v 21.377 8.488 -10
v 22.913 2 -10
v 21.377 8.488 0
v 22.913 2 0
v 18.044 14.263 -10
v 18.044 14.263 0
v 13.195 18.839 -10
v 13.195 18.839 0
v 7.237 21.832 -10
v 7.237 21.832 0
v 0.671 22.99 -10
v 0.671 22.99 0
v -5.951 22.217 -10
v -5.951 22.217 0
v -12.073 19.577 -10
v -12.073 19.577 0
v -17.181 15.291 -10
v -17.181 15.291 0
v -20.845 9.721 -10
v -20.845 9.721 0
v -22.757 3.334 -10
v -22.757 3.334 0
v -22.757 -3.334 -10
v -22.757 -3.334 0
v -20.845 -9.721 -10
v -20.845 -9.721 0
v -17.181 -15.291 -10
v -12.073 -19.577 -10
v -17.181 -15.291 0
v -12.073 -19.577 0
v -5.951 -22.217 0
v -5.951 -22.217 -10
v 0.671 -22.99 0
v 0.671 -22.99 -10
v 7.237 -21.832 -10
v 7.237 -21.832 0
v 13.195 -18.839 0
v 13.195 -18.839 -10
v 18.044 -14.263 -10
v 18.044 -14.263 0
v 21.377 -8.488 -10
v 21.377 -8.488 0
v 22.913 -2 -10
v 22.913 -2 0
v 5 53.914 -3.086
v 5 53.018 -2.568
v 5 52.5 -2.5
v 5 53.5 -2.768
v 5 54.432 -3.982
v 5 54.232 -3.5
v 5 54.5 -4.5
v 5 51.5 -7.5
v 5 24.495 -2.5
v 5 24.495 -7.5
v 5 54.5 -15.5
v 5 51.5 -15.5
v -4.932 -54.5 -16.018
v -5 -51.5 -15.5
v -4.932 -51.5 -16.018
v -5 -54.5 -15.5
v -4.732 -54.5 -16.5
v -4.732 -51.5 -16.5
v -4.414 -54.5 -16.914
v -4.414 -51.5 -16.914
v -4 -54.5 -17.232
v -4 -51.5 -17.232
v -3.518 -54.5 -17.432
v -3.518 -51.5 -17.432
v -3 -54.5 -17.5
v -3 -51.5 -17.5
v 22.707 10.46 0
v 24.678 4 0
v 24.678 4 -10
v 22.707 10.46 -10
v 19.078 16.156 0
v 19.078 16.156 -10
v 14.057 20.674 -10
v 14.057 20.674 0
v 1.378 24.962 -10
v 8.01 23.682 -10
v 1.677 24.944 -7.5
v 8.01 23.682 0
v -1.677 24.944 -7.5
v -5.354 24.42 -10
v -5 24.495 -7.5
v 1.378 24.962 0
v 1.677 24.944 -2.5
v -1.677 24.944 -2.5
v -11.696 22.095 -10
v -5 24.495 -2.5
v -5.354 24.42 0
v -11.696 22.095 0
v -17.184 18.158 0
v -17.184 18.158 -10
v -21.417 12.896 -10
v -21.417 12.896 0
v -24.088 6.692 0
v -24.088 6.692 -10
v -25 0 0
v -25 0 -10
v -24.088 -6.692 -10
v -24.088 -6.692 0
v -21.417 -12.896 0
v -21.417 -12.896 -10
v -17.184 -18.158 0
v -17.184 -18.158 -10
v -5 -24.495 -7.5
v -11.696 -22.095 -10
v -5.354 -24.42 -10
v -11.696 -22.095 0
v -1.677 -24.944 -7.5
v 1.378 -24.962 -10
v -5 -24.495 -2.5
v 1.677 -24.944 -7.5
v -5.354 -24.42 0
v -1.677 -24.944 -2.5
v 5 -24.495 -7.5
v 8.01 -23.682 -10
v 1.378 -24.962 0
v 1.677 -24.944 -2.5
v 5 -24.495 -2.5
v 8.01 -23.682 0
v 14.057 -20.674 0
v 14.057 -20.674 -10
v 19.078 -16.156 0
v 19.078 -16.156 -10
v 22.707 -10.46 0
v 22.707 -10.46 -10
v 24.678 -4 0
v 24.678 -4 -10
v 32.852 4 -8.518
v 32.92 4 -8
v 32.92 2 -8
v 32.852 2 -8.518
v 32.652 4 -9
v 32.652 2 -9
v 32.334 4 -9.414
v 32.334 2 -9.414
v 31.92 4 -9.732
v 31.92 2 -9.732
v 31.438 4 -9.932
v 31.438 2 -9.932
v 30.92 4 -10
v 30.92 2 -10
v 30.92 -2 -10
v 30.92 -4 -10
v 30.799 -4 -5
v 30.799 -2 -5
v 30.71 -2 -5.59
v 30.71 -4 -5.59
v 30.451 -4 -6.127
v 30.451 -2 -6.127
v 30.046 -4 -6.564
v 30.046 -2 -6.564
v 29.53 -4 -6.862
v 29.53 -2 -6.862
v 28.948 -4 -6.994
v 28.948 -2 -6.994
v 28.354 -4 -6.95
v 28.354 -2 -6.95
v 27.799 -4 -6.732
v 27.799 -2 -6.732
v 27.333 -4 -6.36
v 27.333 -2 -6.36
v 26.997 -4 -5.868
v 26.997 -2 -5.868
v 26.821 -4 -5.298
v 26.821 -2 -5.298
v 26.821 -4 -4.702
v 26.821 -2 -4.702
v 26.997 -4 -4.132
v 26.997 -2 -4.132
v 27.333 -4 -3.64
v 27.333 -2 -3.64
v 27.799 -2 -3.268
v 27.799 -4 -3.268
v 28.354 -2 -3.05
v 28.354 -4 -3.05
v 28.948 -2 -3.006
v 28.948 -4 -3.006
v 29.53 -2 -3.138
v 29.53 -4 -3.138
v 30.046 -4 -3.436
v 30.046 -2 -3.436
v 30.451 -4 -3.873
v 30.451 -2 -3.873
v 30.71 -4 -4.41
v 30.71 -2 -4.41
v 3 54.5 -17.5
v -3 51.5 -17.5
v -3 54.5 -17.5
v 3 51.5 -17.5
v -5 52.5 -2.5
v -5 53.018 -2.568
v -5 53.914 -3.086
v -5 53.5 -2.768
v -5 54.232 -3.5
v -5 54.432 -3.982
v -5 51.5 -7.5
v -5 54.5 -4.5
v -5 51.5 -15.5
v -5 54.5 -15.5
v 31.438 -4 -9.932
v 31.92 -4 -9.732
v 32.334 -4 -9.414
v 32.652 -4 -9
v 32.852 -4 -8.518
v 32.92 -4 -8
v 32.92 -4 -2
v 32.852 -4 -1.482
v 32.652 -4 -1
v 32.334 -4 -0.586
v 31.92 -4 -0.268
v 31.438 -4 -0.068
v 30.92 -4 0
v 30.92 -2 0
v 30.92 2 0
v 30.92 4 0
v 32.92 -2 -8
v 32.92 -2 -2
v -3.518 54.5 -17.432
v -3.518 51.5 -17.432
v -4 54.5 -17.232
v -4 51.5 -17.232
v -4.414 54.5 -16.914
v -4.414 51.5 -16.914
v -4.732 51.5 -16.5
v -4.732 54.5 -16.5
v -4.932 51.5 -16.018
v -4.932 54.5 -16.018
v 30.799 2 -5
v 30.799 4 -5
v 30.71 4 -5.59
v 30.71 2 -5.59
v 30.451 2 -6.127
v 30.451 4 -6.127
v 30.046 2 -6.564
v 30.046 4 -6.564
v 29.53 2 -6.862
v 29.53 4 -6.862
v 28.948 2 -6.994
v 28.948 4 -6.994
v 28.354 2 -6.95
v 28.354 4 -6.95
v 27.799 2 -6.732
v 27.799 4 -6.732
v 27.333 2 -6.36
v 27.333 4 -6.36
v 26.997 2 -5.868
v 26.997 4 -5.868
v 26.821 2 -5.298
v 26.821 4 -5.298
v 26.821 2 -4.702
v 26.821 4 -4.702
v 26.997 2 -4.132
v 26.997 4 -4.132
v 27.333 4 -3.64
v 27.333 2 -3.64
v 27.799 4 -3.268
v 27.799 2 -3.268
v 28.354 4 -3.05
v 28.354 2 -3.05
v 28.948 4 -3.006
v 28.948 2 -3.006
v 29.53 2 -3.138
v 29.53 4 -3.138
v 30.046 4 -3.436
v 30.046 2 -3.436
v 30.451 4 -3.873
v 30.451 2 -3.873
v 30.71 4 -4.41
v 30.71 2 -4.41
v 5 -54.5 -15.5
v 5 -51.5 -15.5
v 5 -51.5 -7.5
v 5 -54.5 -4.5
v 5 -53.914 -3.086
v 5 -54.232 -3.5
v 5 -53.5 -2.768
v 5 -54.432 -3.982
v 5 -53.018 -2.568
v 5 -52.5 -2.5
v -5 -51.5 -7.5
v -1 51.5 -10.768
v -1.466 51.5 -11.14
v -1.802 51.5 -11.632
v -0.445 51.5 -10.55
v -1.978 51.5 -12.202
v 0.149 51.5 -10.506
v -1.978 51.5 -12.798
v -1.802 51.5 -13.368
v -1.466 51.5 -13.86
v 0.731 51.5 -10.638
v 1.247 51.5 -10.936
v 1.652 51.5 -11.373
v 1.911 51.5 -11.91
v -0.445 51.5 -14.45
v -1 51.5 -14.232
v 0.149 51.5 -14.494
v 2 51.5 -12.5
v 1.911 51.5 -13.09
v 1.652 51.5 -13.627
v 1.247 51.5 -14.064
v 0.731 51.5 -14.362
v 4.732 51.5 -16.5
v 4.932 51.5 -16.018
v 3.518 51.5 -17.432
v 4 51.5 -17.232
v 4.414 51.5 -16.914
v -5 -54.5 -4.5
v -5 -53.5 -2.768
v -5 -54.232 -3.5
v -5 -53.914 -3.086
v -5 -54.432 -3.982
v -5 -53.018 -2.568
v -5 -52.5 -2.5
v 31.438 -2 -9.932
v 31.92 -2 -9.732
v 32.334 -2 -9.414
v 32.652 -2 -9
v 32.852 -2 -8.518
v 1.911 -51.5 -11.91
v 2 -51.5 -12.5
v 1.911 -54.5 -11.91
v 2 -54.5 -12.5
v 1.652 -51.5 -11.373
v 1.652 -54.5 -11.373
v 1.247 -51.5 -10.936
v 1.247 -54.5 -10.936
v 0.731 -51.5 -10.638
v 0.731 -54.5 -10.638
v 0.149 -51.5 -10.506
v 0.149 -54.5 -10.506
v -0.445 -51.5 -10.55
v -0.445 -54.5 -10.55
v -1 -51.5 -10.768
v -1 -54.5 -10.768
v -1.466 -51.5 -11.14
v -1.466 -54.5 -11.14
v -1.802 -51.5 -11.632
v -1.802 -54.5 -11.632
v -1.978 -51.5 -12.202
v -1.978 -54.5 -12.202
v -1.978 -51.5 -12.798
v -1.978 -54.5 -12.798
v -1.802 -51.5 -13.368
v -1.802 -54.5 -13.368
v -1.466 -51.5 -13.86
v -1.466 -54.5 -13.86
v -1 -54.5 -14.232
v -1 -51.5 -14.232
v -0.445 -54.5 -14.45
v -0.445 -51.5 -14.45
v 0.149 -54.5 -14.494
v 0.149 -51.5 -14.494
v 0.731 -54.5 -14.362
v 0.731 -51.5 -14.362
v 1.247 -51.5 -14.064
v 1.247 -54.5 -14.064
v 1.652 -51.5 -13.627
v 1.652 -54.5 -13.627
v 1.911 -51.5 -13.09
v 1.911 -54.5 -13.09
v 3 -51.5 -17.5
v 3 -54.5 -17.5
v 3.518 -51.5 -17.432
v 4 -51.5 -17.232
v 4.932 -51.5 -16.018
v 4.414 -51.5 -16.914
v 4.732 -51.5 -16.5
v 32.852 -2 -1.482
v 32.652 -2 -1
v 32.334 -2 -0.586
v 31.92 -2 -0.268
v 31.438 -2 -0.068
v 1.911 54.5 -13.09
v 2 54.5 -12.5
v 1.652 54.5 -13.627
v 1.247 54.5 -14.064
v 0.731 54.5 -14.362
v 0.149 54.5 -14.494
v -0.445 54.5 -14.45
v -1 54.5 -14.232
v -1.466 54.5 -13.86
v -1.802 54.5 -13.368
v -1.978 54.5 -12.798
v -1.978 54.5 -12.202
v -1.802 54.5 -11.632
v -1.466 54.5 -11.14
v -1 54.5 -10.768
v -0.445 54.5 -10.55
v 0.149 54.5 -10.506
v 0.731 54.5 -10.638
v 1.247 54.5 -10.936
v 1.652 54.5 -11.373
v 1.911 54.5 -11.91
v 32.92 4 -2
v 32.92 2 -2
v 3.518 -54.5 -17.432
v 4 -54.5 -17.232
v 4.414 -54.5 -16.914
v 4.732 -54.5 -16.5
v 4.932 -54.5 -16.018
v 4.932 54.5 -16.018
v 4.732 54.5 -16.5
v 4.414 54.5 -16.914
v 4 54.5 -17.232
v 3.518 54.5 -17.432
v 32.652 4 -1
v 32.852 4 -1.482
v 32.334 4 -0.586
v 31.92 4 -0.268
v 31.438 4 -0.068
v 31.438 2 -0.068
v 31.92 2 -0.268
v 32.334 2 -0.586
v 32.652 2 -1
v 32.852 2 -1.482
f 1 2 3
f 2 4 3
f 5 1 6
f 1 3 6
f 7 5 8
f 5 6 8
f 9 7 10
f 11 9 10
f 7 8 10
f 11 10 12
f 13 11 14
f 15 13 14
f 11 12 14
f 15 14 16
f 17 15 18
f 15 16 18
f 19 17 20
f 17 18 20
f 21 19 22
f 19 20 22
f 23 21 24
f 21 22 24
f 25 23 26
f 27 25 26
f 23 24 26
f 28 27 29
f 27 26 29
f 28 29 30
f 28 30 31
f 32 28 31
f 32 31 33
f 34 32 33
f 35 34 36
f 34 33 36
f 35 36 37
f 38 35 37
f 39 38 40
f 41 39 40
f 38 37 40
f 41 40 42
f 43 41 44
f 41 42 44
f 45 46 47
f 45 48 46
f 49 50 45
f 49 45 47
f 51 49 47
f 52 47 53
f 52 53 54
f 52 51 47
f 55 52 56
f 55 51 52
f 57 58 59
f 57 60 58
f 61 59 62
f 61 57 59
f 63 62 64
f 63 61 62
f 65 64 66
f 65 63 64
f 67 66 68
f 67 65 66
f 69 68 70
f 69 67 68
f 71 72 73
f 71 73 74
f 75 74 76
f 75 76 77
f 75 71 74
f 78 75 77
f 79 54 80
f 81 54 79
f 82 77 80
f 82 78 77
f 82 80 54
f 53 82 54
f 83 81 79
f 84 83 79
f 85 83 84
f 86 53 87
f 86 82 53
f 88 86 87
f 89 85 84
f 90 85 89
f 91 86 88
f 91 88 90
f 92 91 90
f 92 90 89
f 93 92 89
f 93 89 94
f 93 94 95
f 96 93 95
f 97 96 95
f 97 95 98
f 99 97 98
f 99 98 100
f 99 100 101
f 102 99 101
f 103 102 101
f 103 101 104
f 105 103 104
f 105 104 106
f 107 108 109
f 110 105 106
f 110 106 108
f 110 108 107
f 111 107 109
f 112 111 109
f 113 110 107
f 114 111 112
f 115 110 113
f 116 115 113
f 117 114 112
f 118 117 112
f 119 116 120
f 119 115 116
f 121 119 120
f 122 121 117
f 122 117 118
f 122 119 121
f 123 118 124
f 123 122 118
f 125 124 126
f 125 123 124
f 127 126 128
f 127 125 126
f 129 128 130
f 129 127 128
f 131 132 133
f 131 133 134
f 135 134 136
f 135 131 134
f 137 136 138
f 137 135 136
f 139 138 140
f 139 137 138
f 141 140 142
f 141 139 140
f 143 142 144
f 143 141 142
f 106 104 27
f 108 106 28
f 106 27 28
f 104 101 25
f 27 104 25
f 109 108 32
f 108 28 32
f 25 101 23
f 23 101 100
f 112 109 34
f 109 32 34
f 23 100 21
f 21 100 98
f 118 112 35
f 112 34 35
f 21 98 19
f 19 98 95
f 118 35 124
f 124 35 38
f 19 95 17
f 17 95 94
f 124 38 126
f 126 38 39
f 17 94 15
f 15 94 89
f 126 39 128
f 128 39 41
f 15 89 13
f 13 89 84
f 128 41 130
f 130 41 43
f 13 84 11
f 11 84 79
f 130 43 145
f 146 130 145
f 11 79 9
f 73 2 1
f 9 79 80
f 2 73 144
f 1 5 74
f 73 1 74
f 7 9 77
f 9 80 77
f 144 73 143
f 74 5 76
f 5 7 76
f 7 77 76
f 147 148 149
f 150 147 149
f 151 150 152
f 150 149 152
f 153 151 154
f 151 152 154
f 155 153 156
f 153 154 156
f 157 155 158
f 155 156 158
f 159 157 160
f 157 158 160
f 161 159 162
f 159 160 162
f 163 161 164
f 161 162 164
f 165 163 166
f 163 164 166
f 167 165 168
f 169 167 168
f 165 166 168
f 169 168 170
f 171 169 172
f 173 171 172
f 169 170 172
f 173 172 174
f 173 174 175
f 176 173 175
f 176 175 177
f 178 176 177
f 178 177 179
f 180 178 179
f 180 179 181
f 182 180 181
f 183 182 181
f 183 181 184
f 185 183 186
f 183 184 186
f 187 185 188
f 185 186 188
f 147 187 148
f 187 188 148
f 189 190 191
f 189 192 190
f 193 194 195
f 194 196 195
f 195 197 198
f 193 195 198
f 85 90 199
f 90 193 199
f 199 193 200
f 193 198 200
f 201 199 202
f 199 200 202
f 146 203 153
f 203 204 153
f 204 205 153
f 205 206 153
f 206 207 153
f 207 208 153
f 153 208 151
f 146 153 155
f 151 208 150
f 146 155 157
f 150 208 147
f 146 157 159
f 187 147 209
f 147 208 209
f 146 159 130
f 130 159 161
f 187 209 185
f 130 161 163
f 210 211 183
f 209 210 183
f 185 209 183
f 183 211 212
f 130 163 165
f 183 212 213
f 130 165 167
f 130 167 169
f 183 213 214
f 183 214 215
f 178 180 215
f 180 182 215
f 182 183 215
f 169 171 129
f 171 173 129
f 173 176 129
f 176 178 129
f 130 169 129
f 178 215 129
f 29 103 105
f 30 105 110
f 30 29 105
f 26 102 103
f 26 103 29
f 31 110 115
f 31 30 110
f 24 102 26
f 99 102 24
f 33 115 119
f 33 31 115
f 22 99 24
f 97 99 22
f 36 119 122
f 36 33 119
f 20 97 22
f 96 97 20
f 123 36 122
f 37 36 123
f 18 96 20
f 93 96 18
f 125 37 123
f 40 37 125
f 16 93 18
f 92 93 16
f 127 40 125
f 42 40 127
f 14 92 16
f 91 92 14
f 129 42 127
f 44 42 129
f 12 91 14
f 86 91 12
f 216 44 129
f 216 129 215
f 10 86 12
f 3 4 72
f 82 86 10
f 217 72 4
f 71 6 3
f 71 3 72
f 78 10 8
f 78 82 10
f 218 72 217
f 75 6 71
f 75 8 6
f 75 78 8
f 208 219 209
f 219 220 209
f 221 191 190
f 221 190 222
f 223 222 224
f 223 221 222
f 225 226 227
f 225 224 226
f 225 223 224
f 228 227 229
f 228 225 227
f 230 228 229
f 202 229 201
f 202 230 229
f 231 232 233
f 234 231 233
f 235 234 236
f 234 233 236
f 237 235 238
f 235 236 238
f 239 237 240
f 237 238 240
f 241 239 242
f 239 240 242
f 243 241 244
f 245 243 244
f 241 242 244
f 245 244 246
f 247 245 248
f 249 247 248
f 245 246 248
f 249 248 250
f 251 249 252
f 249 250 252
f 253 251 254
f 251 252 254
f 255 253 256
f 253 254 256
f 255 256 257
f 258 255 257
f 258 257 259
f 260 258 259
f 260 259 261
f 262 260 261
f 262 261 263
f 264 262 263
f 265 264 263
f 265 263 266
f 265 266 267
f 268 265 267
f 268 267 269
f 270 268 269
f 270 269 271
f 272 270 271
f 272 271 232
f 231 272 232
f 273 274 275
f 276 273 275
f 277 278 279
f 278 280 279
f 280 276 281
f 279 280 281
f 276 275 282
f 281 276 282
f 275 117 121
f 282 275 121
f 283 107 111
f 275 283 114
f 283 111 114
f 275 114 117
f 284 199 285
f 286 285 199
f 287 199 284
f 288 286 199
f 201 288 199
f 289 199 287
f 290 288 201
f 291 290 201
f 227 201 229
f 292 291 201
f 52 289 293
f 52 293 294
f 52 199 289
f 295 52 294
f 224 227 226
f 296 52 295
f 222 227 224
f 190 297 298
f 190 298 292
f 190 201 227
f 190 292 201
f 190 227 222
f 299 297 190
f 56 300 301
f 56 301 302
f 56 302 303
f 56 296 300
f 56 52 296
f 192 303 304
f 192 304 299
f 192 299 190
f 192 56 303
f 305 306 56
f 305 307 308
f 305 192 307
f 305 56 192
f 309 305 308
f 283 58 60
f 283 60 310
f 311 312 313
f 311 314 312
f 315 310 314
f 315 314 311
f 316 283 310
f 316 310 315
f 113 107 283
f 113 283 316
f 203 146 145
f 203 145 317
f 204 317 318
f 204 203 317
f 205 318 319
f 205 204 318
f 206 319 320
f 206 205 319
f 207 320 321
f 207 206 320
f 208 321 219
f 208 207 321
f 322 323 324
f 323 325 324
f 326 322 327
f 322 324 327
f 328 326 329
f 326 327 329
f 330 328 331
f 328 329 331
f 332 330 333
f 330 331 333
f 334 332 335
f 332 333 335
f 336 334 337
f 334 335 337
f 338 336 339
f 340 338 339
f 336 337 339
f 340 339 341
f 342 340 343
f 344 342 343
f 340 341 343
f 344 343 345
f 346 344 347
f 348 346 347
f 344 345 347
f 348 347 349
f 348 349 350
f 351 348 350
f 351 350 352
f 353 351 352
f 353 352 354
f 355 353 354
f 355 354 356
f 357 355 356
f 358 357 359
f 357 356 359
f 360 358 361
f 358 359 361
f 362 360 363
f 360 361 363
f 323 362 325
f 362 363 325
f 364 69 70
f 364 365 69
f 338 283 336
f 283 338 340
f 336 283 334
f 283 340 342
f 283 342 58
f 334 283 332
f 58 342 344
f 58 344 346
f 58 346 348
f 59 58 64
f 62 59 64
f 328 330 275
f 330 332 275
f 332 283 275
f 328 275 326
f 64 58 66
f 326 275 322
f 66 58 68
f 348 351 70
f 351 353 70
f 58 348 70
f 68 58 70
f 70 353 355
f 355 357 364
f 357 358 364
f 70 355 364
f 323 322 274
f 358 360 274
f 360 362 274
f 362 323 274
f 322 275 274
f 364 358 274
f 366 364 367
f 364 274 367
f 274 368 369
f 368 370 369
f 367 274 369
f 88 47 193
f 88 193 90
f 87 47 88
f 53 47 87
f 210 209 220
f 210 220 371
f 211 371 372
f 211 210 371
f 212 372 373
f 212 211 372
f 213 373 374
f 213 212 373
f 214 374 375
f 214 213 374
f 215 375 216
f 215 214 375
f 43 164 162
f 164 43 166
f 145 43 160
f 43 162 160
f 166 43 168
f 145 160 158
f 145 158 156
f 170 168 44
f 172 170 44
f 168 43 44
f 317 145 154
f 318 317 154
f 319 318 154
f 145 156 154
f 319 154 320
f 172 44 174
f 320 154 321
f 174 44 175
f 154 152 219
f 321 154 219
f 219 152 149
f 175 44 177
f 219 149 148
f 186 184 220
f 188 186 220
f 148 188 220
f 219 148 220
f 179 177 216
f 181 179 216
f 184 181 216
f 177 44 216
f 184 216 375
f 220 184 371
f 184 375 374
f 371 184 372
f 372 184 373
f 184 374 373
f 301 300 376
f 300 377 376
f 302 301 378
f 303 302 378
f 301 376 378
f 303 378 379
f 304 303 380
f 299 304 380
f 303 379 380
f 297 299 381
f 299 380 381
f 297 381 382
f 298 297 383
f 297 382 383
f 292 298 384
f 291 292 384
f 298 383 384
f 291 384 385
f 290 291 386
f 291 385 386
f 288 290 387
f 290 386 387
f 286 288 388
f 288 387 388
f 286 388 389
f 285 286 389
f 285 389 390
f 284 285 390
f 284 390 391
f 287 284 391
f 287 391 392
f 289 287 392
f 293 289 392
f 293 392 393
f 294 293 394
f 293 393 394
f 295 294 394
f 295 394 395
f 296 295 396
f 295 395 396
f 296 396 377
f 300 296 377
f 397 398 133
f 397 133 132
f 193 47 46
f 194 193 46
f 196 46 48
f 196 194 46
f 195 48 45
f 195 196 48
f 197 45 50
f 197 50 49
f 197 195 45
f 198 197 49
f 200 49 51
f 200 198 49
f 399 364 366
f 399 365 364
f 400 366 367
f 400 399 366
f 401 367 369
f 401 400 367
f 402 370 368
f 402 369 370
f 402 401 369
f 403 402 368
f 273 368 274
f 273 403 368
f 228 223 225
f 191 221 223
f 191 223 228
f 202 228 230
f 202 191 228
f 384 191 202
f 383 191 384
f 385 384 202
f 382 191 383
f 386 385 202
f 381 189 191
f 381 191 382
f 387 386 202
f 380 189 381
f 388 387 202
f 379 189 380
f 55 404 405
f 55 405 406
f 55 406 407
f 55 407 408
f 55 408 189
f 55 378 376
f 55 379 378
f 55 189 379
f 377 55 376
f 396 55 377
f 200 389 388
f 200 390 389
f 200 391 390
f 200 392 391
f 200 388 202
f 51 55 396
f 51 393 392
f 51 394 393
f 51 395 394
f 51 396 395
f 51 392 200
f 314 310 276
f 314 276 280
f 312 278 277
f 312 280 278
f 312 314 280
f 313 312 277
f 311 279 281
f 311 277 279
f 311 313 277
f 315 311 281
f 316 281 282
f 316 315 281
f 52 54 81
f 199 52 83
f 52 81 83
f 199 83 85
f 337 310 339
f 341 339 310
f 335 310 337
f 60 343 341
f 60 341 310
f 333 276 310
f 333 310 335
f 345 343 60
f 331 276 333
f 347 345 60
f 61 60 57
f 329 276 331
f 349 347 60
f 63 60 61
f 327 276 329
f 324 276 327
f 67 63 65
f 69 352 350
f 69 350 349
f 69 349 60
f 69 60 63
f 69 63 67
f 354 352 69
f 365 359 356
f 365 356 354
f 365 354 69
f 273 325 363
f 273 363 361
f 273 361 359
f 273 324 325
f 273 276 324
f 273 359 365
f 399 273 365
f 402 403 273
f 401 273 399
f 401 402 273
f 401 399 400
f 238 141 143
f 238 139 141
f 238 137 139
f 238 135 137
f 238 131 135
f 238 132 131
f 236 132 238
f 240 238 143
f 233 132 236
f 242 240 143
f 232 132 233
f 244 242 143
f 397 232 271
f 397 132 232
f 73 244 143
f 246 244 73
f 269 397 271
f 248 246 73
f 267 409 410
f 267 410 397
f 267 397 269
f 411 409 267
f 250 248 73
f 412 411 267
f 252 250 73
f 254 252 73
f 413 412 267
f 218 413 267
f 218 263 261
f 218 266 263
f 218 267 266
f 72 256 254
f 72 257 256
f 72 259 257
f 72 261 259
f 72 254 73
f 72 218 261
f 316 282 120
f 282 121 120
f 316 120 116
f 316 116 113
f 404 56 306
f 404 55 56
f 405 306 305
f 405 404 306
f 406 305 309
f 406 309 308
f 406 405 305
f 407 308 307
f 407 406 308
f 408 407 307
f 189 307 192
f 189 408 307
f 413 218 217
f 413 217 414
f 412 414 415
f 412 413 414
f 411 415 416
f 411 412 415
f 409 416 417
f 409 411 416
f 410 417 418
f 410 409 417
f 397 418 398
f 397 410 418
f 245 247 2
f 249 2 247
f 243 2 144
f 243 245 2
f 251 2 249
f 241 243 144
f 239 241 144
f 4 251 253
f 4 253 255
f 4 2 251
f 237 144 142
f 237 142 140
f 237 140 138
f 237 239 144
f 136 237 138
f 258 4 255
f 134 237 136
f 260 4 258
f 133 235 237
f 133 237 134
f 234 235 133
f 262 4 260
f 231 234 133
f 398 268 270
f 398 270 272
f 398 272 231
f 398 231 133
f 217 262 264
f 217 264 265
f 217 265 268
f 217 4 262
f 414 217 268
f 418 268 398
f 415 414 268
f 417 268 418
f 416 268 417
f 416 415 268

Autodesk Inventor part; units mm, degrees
ref_plane "XY Plane" through (0, 0, 0) normal (0, 0, 1) x (1, 0, 0)
sketch "Sketch1" plane through (0, 0, 0) normal (0, 0, 1) x (1, 0, 0)
  arc A0 (22.9129, 2) -> (22.9129, -2) centre (0, 0) ccw
  arc A1 (24.6779, 4) -> (24.6779, -4) centre (0, 0) ccw
  line L0 (22.9129, 2) -> (24.9199, 2)
  line L1 (22.9129, -2) -> (24.9199, -2)
  line L2 (24.9199, 2) -> (32.9199, 2)
  line L3 (32.9199, 2) -> (32.9199, 4)
  line L4 (32.9199, 4) -> (24.6779, 4)
  line L5 (24.9199, -2) -> (32.9199, -2)
  line L6 (32.9199, -2) -> (32.9199, -4)
  line L7 (32.9199, -4) -> (24.6779, -4)
  dimension "d0" = 46
  dimension "d1" = 50
  dimension "d7" = 2
  dimension "d9" = 2
extrude "Extrusion1" add sketch "Sketch1" against normal blind 10
sketch "Sketch2" plane through (24.6779, 4, 0) normal (0, 1, 0) x (1, 0, 0)
  line L0 (8.2419, 0) -> (0, 0) projected
  line L1 (8.2419, 0) -> (8.2419, 10) projected
  line L2 (0, 10) -> (8.2419, 10) projected
  line L3 (0, 0) -> (0, 10) projected
  circle A0 centre (4.121, 5) radius 2
  point P0 (-24.6779, 0)
  dimension "d12" = 4
extrude "Extrusion2" cut sketch "Sketch2" against normal blind 8.5 contours A0
ref_plane "Work Plane1" through (24.6779, 24, 0) normal (0, 1, 0) x (1, 0, 0)
sketch "Sketch3" plane through (24.6779, 24, 0) normal (0, 1, 0) x (1, 0, 0)
  line L0 (-24.6779, 0) -> (-24.6779, 10)
  line L1 (-19.6779, 7.5) -> (-29.6779, 7.5)
  line L2 (-29.6779, 2.5) -> (-19.6779, 2.5)
  line L3 (-19.6779, 2.5) -> (-19.6779, 7.5)
  line L4 (-29.6779, 2.5) -> (-29.6779, 7.5)
  point P0 (-24.6779, 5)
extrude "Extrusion3" add sketch "Sketch3" along normal blind 27.5
sketch "Sketch4" plane through (5, 24.4949, -6) normal (1, 0, 0) x (0, 0, -1)
  line L0 (1.5, 27.0051) -> (-3.5, 27.0051) projected
  line L1 (-3.5, 27.0051) -> (11.5, 27.0051)
  line L2 (11.5, 27.0051) -> (11.5, 30.0051)
  line L3 (11.5, 30.0051) -> (-3.5, 30.0051)
  line L4 (-3.5, 30.0051) -> (-3.5, 27.0051)
  point P0 (-6, -24.4949)
  dimension "d27" = 15
  dimension "d28" = 3
extrude "Extrusion4" add sketch "Sketch4" against normal blind 10
ref_plane "Work Plane2" through (0, 0, 0) normal (0.7071, -0.7071, 0) x (0, 0, -1)
sketch "Sketch5" plane through (5, 54.5, -2.5) normal (0, 1, 0) x (1, 0, 0)
  circle A0 centre (-5, 10) radius 2
  dimension "d29" = 4
extrude "Extrusion5" cut sketch "Sketch5" against normal blind 4
mirror "Mirror2" about plane through (0, 0, 0) normal (0, 1, 0) of "Extrusion4", "Extrusion5", "Extrusion3"
fillet "Fillet1" radius 2 10 edges at (0, 54.5, -2.5) (5, 53, -17.5) (-5, 53, -17.5) (5, -53, -17.5) (-5, -53, -17.5) (0, -54.5, -2.5) (32.9199, 3, 0) (32.9199, 3, -10) (32.9199, -3, 0) (32.9199, -3, -10)
properties part number "SupportBracket_BilgePumpMotor" material "ABS Plastic"
